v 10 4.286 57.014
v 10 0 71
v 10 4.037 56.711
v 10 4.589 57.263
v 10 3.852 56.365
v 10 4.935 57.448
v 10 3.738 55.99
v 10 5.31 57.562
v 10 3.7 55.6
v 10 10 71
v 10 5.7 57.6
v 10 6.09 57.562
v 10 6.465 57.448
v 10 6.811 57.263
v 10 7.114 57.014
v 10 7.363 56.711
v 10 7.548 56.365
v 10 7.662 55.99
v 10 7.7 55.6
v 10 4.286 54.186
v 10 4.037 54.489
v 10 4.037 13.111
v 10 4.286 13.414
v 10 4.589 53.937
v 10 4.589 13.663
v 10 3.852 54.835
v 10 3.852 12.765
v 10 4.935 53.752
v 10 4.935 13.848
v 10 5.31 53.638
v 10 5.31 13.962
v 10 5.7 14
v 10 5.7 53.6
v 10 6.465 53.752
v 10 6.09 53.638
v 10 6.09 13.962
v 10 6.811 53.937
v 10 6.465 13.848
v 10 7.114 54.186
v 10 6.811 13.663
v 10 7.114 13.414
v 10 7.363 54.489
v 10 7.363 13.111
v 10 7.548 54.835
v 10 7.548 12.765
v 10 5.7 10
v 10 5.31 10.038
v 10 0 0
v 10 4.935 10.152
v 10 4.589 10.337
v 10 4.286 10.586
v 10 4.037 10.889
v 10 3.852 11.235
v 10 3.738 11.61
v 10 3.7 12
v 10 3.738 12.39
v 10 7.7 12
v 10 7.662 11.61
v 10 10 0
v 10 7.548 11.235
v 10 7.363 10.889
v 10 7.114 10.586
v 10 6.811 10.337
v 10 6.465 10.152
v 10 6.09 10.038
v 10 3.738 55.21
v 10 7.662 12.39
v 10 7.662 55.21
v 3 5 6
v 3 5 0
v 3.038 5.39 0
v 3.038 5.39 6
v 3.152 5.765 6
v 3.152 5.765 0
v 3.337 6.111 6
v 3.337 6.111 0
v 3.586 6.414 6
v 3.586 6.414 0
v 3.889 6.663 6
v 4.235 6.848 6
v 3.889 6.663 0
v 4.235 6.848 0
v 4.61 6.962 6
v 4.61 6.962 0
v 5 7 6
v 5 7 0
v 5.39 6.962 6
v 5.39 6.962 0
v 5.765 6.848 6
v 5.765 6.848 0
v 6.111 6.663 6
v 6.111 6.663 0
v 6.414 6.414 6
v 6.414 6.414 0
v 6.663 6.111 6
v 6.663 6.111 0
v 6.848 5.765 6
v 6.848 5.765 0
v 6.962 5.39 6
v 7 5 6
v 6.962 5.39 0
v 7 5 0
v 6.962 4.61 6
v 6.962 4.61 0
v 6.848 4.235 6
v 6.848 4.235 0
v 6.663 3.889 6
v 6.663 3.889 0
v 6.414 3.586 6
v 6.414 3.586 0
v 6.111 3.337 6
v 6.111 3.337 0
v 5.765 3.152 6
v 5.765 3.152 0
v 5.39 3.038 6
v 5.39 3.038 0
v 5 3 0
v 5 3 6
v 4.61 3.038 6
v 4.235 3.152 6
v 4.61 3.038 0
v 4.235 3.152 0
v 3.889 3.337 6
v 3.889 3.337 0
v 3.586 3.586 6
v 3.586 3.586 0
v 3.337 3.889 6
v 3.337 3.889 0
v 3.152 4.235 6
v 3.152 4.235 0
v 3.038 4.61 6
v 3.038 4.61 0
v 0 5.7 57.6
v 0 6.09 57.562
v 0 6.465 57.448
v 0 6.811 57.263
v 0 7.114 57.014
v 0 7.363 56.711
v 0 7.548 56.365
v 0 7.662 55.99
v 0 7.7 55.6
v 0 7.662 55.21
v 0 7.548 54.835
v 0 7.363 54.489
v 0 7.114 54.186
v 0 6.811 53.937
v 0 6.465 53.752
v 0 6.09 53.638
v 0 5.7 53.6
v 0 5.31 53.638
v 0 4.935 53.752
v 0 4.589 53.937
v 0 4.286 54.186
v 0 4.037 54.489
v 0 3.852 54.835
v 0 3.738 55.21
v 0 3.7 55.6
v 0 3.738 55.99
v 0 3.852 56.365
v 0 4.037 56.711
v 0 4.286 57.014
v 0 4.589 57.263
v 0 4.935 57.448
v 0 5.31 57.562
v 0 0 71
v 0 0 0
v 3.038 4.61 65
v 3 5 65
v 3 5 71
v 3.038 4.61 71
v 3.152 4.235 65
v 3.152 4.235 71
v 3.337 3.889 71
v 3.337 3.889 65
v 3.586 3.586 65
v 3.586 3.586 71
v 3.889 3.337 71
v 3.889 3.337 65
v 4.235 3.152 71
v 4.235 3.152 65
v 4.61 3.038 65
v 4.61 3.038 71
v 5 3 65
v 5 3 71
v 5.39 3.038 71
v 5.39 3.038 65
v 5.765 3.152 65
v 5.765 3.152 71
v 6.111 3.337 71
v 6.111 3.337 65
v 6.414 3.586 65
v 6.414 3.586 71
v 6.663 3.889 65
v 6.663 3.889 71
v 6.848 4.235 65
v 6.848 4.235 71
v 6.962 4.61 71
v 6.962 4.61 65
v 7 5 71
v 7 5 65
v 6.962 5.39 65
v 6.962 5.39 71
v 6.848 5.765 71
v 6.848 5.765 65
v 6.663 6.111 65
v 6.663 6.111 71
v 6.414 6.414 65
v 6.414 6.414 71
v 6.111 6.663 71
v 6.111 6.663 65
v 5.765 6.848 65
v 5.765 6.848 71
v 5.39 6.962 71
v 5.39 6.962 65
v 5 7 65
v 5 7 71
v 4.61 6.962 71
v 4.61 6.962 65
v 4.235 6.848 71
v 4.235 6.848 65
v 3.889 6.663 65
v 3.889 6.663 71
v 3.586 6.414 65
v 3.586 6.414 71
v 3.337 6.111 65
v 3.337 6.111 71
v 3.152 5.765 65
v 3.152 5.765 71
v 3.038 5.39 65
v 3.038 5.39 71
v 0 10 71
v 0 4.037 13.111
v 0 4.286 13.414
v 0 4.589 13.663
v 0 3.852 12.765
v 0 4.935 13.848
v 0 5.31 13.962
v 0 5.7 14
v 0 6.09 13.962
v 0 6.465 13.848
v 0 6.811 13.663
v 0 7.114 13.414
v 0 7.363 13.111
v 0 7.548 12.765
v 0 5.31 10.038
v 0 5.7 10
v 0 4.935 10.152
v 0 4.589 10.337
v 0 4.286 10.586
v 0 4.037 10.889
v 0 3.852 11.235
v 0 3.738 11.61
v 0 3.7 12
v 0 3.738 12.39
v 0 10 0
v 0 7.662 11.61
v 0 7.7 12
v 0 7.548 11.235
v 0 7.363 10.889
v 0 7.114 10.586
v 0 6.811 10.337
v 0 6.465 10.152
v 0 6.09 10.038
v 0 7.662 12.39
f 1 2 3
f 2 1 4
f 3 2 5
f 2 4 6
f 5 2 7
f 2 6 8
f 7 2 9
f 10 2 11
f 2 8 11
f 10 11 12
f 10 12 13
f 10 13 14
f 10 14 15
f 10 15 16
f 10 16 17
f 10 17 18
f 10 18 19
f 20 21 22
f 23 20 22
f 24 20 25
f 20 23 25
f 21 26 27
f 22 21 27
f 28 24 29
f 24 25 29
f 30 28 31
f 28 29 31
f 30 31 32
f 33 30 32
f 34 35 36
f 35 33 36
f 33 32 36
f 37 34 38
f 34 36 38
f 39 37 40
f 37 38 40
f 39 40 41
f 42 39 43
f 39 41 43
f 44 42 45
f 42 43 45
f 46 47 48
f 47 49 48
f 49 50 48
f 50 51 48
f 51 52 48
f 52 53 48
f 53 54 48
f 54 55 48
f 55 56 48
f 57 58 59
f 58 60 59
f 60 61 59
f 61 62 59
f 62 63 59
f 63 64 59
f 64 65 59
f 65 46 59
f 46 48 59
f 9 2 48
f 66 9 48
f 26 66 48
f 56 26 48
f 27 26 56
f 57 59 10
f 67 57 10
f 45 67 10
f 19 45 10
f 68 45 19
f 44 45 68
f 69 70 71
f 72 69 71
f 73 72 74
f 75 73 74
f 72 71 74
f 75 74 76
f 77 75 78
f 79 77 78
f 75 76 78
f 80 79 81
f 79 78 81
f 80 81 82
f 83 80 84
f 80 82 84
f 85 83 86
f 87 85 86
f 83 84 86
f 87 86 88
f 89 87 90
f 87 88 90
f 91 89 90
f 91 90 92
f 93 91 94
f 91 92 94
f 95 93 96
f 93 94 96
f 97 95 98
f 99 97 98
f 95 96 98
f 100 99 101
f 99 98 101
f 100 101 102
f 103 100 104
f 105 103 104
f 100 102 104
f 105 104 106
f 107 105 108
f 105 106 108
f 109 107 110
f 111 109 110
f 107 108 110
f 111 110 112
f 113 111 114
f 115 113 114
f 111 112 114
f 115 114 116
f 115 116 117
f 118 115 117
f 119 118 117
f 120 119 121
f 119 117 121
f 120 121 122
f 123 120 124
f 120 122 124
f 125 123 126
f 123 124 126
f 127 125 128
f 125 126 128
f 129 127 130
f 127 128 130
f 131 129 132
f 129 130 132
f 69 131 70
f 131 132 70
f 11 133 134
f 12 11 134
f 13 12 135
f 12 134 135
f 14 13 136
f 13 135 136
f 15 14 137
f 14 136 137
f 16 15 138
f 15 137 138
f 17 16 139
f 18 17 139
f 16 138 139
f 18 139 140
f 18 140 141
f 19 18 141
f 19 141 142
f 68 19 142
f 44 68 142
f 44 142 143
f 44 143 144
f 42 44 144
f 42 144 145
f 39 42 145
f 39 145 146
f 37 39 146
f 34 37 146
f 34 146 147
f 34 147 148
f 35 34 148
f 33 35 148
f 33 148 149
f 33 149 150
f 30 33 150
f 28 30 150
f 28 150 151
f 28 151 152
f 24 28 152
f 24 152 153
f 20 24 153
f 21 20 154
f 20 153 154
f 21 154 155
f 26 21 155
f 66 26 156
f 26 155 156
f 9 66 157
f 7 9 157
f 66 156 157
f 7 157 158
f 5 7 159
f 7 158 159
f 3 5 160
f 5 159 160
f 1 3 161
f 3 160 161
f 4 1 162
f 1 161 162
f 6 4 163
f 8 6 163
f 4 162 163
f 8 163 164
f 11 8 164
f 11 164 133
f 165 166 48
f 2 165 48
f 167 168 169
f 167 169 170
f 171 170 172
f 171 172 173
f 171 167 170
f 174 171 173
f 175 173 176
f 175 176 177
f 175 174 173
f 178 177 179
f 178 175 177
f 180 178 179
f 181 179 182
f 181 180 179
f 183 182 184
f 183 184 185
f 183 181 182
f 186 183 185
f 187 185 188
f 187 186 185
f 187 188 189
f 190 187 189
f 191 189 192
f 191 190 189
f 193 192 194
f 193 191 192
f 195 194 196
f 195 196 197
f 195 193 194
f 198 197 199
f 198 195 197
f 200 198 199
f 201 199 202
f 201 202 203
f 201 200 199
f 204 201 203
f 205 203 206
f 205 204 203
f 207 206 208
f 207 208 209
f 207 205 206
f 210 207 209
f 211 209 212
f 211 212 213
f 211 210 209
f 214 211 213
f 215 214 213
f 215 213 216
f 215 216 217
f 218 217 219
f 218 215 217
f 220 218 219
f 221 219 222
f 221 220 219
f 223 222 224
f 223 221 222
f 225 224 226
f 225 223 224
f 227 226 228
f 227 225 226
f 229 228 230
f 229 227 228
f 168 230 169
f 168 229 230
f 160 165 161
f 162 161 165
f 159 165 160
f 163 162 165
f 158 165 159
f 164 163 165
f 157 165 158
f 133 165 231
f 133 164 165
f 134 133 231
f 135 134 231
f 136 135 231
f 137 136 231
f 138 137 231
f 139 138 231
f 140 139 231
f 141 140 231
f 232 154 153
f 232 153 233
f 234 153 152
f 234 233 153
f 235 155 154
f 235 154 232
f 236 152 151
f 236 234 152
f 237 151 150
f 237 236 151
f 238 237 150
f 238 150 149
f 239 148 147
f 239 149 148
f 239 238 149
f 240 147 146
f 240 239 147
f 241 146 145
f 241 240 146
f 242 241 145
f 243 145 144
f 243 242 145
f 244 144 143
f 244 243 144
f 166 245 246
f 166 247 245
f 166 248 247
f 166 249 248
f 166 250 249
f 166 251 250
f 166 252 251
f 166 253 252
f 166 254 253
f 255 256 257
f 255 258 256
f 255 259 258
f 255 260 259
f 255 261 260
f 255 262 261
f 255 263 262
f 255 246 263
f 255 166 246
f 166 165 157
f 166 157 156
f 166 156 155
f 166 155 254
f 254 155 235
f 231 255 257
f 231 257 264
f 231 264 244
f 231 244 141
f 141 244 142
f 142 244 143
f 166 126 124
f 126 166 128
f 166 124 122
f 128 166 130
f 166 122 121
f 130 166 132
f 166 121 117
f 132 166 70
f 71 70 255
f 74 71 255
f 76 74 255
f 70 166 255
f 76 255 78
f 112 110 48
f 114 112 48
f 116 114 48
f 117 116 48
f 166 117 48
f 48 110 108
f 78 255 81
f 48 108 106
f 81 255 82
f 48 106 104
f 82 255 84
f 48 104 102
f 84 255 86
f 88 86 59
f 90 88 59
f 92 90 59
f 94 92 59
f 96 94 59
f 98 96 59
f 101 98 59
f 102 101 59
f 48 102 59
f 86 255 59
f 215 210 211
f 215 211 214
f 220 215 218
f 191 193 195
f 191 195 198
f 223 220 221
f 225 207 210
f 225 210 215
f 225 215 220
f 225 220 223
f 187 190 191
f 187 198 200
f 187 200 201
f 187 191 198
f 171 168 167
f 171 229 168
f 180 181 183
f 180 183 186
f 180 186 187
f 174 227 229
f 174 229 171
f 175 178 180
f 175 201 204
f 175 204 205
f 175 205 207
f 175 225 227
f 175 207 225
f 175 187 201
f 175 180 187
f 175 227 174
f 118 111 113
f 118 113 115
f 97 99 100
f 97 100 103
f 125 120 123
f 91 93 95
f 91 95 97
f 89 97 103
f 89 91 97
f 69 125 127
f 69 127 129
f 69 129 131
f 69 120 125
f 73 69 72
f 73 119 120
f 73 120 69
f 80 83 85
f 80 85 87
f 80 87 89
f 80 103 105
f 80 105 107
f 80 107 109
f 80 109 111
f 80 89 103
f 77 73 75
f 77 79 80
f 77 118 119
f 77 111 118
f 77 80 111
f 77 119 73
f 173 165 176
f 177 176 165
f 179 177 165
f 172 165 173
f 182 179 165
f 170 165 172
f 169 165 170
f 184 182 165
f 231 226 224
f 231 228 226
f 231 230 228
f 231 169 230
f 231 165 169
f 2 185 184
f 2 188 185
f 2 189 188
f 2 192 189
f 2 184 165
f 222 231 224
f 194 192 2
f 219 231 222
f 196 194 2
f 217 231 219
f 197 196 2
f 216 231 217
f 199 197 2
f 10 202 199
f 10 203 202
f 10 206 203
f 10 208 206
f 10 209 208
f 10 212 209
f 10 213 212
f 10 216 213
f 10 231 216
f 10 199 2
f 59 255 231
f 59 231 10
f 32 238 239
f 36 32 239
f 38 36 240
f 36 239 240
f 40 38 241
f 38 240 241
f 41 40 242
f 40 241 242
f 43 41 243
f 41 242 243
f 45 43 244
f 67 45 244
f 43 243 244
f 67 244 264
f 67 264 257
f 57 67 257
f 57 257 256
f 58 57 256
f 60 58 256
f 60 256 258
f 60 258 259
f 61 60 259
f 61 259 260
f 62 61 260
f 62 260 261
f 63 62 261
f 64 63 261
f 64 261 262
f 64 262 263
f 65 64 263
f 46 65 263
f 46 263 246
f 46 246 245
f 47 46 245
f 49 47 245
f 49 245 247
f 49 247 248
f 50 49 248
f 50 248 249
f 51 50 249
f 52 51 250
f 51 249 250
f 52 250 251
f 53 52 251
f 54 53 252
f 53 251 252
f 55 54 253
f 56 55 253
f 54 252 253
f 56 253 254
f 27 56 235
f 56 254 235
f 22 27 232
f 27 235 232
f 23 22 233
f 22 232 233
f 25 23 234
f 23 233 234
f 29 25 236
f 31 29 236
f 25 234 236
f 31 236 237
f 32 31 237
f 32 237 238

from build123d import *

# Parameters (mm, degrees)
ESQUISSE1_W             = 10
ESQUISSE1_H             = 10
BOSS_EXTRU_1_DEPTH      = 71
ESQUISSE2_R             = 2
ENL_V_MAT_EXTRU_1_DEPTH = 73.394751191
ESQUISSE3_R             = 2
ENL_V_MAT_EXTRU_2_DEPTH = 6
ENL_V_START             = -6
ESQUISSE4_R             = 2
ENL_V_MAT_EXTRU_3_DEPTH = 6


with BuildPart() as part:
    # Esquisse1 → Boss.-Extru.1 (new body)
    with BuildSketch(Plane.XY):
        with Locations((5, 5)):
            Rectangle(ESQUISSE1_W, ESQUISSE1_H)
    extrude(amount=BOSS_EXTRU_1_DEPTH)

    # Esquisse2 → Enlèv. mat.-Extru.1 (cut, through all)
    with BuildSketch(Plane.ZY):
        with Locations((12, 5.7)):
            Circle(ESQUISSE2_R)
        with Locations((55.6, 5.7)):
            Circle(ESQUISSE2_R)
    extrude(amount=-ENL_V_MAT_EXTRU_1_DEPTH, mode=Mode.SUBTRACT)

    # Esquisse3 → Enlèv. mat.-Extru.2 (cut)
    with BuildSketch(Plane(origin=(0, 0, 0), x_dir=(-1, 0, 0), z_dir=(0, 0, -1))):
        with Locations((-5, 5)):
            Circle(ESQUISSE3_R)
    extrude(amount=-ENL_V_MAT_EXTRU_2_DEPTH, mode=Mode.SUBTRACT)

    # Esquisse4 → Enlèv. mat.-Extru.3 (cut)
    with BuildSketch(Plane.XY.offset(71).offset(ENL_V_START)):
        with Locations(Location((5, 5, 0), (0, 0, 180))):
            Circle(ESQUISSE4_R)
    extrude(amount=ENL_V_MAT_EXTRU_3_DEPTH, mode=Mode.SUBTRACT)


solid = part.part
